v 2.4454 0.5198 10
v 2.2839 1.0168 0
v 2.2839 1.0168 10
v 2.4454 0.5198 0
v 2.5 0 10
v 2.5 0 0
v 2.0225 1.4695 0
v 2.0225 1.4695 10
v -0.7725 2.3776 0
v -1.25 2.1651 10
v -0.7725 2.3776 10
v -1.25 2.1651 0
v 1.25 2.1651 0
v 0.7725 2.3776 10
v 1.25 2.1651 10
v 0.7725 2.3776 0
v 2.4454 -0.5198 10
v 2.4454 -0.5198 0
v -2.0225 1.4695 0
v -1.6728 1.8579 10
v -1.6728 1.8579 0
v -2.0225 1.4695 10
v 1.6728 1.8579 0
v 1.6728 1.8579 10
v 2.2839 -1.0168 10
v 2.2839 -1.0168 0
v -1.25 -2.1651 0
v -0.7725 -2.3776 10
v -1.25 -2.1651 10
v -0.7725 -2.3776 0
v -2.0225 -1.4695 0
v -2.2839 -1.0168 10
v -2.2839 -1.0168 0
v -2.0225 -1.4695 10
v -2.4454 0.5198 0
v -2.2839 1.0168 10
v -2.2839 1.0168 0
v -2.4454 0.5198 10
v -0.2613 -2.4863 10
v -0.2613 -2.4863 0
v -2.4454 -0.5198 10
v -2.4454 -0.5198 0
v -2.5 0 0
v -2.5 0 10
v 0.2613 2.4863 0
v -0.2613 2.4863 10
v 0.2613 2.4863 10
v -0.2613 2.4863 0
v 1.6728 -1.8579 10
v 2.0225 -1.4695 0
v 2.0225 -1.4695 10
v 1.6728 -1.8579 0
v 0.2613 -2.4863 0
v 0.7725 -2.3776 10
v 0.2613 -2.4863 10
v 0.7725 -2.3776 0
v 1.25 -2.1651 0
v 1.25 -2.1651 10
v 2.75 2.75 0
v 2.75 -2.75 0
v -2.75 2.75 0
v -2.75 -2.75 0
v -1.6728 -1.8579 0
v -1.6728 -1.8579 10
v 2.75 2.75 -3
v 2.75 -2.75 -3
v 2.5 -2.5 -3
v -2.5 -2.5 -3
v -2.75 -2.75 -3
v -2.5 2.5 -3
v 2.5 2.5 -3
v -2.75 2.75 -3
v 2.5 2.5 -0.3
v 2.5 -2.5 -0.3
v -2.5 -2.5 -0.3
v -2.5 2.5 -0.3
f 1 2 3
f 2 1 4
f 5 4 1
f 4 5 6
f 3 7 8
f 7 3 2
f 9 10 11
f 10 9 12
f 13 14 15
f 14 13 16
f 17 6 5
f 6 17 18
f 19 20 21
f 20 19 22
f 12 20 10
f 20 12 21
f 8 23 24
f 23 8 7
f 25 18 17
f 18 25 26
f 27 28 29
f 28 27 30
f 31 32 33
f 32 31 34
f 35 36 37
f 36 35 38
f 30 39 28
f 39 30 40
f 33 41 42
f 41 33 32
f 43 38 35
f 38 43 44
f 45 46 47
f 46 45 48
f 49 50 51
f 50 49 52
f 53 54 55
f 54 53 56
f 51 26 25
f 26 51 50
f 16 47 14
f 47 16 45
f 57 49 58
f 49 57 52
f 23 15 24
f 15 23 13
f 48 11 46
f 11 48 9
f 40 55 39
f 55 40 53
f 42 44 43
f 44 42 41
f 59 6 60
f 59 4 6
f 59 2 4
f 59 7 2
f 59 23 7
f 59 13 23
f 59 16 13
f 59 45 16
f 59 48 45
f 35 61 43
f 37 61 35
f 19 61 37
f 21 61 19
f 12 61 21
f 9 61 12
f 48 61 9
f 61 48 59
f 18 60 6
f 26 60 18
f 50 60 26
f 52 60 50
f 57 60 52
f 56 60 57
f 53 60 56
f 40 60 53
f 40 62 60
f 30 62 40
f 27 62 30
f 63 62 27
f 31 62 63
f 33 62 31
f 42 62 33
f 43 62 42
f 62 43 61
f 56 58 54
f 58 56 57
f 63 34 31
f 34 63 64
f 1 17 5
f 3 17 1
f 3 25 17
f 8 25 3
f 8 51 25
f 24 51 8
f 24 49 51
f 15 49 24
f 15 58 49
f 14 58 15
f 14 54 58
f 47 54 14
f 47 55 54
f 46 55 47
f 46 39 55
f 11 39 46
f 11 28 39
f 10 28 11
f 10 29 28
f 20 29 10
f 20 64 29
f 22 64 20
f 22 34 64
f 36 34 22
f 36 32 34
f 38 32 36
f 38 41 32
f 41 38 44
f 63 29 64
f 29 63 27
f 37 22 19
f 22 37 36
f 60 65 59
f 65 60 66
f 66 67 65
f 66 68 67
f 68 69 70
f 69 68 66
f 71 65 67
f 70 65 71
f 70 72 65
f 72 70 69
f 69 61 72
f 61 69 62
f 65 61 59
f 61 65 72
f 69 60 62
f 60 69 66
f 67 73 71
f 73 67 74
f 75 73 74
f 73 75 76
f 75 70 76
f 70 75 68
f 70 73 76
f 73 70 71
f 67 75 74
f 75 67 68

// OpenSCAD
rotate([00,0,0])
    difference()
    {
    union()
    {
    scale([0.25,0.25,1])
    cylinder(10,10,10);
    
    
    translate([0,0,-1.5]) 
    cube([5.5,5.5,3],true);
    }
    translate([0,0,-1.8]) 
    cube([5,5,3],true);
    
}
